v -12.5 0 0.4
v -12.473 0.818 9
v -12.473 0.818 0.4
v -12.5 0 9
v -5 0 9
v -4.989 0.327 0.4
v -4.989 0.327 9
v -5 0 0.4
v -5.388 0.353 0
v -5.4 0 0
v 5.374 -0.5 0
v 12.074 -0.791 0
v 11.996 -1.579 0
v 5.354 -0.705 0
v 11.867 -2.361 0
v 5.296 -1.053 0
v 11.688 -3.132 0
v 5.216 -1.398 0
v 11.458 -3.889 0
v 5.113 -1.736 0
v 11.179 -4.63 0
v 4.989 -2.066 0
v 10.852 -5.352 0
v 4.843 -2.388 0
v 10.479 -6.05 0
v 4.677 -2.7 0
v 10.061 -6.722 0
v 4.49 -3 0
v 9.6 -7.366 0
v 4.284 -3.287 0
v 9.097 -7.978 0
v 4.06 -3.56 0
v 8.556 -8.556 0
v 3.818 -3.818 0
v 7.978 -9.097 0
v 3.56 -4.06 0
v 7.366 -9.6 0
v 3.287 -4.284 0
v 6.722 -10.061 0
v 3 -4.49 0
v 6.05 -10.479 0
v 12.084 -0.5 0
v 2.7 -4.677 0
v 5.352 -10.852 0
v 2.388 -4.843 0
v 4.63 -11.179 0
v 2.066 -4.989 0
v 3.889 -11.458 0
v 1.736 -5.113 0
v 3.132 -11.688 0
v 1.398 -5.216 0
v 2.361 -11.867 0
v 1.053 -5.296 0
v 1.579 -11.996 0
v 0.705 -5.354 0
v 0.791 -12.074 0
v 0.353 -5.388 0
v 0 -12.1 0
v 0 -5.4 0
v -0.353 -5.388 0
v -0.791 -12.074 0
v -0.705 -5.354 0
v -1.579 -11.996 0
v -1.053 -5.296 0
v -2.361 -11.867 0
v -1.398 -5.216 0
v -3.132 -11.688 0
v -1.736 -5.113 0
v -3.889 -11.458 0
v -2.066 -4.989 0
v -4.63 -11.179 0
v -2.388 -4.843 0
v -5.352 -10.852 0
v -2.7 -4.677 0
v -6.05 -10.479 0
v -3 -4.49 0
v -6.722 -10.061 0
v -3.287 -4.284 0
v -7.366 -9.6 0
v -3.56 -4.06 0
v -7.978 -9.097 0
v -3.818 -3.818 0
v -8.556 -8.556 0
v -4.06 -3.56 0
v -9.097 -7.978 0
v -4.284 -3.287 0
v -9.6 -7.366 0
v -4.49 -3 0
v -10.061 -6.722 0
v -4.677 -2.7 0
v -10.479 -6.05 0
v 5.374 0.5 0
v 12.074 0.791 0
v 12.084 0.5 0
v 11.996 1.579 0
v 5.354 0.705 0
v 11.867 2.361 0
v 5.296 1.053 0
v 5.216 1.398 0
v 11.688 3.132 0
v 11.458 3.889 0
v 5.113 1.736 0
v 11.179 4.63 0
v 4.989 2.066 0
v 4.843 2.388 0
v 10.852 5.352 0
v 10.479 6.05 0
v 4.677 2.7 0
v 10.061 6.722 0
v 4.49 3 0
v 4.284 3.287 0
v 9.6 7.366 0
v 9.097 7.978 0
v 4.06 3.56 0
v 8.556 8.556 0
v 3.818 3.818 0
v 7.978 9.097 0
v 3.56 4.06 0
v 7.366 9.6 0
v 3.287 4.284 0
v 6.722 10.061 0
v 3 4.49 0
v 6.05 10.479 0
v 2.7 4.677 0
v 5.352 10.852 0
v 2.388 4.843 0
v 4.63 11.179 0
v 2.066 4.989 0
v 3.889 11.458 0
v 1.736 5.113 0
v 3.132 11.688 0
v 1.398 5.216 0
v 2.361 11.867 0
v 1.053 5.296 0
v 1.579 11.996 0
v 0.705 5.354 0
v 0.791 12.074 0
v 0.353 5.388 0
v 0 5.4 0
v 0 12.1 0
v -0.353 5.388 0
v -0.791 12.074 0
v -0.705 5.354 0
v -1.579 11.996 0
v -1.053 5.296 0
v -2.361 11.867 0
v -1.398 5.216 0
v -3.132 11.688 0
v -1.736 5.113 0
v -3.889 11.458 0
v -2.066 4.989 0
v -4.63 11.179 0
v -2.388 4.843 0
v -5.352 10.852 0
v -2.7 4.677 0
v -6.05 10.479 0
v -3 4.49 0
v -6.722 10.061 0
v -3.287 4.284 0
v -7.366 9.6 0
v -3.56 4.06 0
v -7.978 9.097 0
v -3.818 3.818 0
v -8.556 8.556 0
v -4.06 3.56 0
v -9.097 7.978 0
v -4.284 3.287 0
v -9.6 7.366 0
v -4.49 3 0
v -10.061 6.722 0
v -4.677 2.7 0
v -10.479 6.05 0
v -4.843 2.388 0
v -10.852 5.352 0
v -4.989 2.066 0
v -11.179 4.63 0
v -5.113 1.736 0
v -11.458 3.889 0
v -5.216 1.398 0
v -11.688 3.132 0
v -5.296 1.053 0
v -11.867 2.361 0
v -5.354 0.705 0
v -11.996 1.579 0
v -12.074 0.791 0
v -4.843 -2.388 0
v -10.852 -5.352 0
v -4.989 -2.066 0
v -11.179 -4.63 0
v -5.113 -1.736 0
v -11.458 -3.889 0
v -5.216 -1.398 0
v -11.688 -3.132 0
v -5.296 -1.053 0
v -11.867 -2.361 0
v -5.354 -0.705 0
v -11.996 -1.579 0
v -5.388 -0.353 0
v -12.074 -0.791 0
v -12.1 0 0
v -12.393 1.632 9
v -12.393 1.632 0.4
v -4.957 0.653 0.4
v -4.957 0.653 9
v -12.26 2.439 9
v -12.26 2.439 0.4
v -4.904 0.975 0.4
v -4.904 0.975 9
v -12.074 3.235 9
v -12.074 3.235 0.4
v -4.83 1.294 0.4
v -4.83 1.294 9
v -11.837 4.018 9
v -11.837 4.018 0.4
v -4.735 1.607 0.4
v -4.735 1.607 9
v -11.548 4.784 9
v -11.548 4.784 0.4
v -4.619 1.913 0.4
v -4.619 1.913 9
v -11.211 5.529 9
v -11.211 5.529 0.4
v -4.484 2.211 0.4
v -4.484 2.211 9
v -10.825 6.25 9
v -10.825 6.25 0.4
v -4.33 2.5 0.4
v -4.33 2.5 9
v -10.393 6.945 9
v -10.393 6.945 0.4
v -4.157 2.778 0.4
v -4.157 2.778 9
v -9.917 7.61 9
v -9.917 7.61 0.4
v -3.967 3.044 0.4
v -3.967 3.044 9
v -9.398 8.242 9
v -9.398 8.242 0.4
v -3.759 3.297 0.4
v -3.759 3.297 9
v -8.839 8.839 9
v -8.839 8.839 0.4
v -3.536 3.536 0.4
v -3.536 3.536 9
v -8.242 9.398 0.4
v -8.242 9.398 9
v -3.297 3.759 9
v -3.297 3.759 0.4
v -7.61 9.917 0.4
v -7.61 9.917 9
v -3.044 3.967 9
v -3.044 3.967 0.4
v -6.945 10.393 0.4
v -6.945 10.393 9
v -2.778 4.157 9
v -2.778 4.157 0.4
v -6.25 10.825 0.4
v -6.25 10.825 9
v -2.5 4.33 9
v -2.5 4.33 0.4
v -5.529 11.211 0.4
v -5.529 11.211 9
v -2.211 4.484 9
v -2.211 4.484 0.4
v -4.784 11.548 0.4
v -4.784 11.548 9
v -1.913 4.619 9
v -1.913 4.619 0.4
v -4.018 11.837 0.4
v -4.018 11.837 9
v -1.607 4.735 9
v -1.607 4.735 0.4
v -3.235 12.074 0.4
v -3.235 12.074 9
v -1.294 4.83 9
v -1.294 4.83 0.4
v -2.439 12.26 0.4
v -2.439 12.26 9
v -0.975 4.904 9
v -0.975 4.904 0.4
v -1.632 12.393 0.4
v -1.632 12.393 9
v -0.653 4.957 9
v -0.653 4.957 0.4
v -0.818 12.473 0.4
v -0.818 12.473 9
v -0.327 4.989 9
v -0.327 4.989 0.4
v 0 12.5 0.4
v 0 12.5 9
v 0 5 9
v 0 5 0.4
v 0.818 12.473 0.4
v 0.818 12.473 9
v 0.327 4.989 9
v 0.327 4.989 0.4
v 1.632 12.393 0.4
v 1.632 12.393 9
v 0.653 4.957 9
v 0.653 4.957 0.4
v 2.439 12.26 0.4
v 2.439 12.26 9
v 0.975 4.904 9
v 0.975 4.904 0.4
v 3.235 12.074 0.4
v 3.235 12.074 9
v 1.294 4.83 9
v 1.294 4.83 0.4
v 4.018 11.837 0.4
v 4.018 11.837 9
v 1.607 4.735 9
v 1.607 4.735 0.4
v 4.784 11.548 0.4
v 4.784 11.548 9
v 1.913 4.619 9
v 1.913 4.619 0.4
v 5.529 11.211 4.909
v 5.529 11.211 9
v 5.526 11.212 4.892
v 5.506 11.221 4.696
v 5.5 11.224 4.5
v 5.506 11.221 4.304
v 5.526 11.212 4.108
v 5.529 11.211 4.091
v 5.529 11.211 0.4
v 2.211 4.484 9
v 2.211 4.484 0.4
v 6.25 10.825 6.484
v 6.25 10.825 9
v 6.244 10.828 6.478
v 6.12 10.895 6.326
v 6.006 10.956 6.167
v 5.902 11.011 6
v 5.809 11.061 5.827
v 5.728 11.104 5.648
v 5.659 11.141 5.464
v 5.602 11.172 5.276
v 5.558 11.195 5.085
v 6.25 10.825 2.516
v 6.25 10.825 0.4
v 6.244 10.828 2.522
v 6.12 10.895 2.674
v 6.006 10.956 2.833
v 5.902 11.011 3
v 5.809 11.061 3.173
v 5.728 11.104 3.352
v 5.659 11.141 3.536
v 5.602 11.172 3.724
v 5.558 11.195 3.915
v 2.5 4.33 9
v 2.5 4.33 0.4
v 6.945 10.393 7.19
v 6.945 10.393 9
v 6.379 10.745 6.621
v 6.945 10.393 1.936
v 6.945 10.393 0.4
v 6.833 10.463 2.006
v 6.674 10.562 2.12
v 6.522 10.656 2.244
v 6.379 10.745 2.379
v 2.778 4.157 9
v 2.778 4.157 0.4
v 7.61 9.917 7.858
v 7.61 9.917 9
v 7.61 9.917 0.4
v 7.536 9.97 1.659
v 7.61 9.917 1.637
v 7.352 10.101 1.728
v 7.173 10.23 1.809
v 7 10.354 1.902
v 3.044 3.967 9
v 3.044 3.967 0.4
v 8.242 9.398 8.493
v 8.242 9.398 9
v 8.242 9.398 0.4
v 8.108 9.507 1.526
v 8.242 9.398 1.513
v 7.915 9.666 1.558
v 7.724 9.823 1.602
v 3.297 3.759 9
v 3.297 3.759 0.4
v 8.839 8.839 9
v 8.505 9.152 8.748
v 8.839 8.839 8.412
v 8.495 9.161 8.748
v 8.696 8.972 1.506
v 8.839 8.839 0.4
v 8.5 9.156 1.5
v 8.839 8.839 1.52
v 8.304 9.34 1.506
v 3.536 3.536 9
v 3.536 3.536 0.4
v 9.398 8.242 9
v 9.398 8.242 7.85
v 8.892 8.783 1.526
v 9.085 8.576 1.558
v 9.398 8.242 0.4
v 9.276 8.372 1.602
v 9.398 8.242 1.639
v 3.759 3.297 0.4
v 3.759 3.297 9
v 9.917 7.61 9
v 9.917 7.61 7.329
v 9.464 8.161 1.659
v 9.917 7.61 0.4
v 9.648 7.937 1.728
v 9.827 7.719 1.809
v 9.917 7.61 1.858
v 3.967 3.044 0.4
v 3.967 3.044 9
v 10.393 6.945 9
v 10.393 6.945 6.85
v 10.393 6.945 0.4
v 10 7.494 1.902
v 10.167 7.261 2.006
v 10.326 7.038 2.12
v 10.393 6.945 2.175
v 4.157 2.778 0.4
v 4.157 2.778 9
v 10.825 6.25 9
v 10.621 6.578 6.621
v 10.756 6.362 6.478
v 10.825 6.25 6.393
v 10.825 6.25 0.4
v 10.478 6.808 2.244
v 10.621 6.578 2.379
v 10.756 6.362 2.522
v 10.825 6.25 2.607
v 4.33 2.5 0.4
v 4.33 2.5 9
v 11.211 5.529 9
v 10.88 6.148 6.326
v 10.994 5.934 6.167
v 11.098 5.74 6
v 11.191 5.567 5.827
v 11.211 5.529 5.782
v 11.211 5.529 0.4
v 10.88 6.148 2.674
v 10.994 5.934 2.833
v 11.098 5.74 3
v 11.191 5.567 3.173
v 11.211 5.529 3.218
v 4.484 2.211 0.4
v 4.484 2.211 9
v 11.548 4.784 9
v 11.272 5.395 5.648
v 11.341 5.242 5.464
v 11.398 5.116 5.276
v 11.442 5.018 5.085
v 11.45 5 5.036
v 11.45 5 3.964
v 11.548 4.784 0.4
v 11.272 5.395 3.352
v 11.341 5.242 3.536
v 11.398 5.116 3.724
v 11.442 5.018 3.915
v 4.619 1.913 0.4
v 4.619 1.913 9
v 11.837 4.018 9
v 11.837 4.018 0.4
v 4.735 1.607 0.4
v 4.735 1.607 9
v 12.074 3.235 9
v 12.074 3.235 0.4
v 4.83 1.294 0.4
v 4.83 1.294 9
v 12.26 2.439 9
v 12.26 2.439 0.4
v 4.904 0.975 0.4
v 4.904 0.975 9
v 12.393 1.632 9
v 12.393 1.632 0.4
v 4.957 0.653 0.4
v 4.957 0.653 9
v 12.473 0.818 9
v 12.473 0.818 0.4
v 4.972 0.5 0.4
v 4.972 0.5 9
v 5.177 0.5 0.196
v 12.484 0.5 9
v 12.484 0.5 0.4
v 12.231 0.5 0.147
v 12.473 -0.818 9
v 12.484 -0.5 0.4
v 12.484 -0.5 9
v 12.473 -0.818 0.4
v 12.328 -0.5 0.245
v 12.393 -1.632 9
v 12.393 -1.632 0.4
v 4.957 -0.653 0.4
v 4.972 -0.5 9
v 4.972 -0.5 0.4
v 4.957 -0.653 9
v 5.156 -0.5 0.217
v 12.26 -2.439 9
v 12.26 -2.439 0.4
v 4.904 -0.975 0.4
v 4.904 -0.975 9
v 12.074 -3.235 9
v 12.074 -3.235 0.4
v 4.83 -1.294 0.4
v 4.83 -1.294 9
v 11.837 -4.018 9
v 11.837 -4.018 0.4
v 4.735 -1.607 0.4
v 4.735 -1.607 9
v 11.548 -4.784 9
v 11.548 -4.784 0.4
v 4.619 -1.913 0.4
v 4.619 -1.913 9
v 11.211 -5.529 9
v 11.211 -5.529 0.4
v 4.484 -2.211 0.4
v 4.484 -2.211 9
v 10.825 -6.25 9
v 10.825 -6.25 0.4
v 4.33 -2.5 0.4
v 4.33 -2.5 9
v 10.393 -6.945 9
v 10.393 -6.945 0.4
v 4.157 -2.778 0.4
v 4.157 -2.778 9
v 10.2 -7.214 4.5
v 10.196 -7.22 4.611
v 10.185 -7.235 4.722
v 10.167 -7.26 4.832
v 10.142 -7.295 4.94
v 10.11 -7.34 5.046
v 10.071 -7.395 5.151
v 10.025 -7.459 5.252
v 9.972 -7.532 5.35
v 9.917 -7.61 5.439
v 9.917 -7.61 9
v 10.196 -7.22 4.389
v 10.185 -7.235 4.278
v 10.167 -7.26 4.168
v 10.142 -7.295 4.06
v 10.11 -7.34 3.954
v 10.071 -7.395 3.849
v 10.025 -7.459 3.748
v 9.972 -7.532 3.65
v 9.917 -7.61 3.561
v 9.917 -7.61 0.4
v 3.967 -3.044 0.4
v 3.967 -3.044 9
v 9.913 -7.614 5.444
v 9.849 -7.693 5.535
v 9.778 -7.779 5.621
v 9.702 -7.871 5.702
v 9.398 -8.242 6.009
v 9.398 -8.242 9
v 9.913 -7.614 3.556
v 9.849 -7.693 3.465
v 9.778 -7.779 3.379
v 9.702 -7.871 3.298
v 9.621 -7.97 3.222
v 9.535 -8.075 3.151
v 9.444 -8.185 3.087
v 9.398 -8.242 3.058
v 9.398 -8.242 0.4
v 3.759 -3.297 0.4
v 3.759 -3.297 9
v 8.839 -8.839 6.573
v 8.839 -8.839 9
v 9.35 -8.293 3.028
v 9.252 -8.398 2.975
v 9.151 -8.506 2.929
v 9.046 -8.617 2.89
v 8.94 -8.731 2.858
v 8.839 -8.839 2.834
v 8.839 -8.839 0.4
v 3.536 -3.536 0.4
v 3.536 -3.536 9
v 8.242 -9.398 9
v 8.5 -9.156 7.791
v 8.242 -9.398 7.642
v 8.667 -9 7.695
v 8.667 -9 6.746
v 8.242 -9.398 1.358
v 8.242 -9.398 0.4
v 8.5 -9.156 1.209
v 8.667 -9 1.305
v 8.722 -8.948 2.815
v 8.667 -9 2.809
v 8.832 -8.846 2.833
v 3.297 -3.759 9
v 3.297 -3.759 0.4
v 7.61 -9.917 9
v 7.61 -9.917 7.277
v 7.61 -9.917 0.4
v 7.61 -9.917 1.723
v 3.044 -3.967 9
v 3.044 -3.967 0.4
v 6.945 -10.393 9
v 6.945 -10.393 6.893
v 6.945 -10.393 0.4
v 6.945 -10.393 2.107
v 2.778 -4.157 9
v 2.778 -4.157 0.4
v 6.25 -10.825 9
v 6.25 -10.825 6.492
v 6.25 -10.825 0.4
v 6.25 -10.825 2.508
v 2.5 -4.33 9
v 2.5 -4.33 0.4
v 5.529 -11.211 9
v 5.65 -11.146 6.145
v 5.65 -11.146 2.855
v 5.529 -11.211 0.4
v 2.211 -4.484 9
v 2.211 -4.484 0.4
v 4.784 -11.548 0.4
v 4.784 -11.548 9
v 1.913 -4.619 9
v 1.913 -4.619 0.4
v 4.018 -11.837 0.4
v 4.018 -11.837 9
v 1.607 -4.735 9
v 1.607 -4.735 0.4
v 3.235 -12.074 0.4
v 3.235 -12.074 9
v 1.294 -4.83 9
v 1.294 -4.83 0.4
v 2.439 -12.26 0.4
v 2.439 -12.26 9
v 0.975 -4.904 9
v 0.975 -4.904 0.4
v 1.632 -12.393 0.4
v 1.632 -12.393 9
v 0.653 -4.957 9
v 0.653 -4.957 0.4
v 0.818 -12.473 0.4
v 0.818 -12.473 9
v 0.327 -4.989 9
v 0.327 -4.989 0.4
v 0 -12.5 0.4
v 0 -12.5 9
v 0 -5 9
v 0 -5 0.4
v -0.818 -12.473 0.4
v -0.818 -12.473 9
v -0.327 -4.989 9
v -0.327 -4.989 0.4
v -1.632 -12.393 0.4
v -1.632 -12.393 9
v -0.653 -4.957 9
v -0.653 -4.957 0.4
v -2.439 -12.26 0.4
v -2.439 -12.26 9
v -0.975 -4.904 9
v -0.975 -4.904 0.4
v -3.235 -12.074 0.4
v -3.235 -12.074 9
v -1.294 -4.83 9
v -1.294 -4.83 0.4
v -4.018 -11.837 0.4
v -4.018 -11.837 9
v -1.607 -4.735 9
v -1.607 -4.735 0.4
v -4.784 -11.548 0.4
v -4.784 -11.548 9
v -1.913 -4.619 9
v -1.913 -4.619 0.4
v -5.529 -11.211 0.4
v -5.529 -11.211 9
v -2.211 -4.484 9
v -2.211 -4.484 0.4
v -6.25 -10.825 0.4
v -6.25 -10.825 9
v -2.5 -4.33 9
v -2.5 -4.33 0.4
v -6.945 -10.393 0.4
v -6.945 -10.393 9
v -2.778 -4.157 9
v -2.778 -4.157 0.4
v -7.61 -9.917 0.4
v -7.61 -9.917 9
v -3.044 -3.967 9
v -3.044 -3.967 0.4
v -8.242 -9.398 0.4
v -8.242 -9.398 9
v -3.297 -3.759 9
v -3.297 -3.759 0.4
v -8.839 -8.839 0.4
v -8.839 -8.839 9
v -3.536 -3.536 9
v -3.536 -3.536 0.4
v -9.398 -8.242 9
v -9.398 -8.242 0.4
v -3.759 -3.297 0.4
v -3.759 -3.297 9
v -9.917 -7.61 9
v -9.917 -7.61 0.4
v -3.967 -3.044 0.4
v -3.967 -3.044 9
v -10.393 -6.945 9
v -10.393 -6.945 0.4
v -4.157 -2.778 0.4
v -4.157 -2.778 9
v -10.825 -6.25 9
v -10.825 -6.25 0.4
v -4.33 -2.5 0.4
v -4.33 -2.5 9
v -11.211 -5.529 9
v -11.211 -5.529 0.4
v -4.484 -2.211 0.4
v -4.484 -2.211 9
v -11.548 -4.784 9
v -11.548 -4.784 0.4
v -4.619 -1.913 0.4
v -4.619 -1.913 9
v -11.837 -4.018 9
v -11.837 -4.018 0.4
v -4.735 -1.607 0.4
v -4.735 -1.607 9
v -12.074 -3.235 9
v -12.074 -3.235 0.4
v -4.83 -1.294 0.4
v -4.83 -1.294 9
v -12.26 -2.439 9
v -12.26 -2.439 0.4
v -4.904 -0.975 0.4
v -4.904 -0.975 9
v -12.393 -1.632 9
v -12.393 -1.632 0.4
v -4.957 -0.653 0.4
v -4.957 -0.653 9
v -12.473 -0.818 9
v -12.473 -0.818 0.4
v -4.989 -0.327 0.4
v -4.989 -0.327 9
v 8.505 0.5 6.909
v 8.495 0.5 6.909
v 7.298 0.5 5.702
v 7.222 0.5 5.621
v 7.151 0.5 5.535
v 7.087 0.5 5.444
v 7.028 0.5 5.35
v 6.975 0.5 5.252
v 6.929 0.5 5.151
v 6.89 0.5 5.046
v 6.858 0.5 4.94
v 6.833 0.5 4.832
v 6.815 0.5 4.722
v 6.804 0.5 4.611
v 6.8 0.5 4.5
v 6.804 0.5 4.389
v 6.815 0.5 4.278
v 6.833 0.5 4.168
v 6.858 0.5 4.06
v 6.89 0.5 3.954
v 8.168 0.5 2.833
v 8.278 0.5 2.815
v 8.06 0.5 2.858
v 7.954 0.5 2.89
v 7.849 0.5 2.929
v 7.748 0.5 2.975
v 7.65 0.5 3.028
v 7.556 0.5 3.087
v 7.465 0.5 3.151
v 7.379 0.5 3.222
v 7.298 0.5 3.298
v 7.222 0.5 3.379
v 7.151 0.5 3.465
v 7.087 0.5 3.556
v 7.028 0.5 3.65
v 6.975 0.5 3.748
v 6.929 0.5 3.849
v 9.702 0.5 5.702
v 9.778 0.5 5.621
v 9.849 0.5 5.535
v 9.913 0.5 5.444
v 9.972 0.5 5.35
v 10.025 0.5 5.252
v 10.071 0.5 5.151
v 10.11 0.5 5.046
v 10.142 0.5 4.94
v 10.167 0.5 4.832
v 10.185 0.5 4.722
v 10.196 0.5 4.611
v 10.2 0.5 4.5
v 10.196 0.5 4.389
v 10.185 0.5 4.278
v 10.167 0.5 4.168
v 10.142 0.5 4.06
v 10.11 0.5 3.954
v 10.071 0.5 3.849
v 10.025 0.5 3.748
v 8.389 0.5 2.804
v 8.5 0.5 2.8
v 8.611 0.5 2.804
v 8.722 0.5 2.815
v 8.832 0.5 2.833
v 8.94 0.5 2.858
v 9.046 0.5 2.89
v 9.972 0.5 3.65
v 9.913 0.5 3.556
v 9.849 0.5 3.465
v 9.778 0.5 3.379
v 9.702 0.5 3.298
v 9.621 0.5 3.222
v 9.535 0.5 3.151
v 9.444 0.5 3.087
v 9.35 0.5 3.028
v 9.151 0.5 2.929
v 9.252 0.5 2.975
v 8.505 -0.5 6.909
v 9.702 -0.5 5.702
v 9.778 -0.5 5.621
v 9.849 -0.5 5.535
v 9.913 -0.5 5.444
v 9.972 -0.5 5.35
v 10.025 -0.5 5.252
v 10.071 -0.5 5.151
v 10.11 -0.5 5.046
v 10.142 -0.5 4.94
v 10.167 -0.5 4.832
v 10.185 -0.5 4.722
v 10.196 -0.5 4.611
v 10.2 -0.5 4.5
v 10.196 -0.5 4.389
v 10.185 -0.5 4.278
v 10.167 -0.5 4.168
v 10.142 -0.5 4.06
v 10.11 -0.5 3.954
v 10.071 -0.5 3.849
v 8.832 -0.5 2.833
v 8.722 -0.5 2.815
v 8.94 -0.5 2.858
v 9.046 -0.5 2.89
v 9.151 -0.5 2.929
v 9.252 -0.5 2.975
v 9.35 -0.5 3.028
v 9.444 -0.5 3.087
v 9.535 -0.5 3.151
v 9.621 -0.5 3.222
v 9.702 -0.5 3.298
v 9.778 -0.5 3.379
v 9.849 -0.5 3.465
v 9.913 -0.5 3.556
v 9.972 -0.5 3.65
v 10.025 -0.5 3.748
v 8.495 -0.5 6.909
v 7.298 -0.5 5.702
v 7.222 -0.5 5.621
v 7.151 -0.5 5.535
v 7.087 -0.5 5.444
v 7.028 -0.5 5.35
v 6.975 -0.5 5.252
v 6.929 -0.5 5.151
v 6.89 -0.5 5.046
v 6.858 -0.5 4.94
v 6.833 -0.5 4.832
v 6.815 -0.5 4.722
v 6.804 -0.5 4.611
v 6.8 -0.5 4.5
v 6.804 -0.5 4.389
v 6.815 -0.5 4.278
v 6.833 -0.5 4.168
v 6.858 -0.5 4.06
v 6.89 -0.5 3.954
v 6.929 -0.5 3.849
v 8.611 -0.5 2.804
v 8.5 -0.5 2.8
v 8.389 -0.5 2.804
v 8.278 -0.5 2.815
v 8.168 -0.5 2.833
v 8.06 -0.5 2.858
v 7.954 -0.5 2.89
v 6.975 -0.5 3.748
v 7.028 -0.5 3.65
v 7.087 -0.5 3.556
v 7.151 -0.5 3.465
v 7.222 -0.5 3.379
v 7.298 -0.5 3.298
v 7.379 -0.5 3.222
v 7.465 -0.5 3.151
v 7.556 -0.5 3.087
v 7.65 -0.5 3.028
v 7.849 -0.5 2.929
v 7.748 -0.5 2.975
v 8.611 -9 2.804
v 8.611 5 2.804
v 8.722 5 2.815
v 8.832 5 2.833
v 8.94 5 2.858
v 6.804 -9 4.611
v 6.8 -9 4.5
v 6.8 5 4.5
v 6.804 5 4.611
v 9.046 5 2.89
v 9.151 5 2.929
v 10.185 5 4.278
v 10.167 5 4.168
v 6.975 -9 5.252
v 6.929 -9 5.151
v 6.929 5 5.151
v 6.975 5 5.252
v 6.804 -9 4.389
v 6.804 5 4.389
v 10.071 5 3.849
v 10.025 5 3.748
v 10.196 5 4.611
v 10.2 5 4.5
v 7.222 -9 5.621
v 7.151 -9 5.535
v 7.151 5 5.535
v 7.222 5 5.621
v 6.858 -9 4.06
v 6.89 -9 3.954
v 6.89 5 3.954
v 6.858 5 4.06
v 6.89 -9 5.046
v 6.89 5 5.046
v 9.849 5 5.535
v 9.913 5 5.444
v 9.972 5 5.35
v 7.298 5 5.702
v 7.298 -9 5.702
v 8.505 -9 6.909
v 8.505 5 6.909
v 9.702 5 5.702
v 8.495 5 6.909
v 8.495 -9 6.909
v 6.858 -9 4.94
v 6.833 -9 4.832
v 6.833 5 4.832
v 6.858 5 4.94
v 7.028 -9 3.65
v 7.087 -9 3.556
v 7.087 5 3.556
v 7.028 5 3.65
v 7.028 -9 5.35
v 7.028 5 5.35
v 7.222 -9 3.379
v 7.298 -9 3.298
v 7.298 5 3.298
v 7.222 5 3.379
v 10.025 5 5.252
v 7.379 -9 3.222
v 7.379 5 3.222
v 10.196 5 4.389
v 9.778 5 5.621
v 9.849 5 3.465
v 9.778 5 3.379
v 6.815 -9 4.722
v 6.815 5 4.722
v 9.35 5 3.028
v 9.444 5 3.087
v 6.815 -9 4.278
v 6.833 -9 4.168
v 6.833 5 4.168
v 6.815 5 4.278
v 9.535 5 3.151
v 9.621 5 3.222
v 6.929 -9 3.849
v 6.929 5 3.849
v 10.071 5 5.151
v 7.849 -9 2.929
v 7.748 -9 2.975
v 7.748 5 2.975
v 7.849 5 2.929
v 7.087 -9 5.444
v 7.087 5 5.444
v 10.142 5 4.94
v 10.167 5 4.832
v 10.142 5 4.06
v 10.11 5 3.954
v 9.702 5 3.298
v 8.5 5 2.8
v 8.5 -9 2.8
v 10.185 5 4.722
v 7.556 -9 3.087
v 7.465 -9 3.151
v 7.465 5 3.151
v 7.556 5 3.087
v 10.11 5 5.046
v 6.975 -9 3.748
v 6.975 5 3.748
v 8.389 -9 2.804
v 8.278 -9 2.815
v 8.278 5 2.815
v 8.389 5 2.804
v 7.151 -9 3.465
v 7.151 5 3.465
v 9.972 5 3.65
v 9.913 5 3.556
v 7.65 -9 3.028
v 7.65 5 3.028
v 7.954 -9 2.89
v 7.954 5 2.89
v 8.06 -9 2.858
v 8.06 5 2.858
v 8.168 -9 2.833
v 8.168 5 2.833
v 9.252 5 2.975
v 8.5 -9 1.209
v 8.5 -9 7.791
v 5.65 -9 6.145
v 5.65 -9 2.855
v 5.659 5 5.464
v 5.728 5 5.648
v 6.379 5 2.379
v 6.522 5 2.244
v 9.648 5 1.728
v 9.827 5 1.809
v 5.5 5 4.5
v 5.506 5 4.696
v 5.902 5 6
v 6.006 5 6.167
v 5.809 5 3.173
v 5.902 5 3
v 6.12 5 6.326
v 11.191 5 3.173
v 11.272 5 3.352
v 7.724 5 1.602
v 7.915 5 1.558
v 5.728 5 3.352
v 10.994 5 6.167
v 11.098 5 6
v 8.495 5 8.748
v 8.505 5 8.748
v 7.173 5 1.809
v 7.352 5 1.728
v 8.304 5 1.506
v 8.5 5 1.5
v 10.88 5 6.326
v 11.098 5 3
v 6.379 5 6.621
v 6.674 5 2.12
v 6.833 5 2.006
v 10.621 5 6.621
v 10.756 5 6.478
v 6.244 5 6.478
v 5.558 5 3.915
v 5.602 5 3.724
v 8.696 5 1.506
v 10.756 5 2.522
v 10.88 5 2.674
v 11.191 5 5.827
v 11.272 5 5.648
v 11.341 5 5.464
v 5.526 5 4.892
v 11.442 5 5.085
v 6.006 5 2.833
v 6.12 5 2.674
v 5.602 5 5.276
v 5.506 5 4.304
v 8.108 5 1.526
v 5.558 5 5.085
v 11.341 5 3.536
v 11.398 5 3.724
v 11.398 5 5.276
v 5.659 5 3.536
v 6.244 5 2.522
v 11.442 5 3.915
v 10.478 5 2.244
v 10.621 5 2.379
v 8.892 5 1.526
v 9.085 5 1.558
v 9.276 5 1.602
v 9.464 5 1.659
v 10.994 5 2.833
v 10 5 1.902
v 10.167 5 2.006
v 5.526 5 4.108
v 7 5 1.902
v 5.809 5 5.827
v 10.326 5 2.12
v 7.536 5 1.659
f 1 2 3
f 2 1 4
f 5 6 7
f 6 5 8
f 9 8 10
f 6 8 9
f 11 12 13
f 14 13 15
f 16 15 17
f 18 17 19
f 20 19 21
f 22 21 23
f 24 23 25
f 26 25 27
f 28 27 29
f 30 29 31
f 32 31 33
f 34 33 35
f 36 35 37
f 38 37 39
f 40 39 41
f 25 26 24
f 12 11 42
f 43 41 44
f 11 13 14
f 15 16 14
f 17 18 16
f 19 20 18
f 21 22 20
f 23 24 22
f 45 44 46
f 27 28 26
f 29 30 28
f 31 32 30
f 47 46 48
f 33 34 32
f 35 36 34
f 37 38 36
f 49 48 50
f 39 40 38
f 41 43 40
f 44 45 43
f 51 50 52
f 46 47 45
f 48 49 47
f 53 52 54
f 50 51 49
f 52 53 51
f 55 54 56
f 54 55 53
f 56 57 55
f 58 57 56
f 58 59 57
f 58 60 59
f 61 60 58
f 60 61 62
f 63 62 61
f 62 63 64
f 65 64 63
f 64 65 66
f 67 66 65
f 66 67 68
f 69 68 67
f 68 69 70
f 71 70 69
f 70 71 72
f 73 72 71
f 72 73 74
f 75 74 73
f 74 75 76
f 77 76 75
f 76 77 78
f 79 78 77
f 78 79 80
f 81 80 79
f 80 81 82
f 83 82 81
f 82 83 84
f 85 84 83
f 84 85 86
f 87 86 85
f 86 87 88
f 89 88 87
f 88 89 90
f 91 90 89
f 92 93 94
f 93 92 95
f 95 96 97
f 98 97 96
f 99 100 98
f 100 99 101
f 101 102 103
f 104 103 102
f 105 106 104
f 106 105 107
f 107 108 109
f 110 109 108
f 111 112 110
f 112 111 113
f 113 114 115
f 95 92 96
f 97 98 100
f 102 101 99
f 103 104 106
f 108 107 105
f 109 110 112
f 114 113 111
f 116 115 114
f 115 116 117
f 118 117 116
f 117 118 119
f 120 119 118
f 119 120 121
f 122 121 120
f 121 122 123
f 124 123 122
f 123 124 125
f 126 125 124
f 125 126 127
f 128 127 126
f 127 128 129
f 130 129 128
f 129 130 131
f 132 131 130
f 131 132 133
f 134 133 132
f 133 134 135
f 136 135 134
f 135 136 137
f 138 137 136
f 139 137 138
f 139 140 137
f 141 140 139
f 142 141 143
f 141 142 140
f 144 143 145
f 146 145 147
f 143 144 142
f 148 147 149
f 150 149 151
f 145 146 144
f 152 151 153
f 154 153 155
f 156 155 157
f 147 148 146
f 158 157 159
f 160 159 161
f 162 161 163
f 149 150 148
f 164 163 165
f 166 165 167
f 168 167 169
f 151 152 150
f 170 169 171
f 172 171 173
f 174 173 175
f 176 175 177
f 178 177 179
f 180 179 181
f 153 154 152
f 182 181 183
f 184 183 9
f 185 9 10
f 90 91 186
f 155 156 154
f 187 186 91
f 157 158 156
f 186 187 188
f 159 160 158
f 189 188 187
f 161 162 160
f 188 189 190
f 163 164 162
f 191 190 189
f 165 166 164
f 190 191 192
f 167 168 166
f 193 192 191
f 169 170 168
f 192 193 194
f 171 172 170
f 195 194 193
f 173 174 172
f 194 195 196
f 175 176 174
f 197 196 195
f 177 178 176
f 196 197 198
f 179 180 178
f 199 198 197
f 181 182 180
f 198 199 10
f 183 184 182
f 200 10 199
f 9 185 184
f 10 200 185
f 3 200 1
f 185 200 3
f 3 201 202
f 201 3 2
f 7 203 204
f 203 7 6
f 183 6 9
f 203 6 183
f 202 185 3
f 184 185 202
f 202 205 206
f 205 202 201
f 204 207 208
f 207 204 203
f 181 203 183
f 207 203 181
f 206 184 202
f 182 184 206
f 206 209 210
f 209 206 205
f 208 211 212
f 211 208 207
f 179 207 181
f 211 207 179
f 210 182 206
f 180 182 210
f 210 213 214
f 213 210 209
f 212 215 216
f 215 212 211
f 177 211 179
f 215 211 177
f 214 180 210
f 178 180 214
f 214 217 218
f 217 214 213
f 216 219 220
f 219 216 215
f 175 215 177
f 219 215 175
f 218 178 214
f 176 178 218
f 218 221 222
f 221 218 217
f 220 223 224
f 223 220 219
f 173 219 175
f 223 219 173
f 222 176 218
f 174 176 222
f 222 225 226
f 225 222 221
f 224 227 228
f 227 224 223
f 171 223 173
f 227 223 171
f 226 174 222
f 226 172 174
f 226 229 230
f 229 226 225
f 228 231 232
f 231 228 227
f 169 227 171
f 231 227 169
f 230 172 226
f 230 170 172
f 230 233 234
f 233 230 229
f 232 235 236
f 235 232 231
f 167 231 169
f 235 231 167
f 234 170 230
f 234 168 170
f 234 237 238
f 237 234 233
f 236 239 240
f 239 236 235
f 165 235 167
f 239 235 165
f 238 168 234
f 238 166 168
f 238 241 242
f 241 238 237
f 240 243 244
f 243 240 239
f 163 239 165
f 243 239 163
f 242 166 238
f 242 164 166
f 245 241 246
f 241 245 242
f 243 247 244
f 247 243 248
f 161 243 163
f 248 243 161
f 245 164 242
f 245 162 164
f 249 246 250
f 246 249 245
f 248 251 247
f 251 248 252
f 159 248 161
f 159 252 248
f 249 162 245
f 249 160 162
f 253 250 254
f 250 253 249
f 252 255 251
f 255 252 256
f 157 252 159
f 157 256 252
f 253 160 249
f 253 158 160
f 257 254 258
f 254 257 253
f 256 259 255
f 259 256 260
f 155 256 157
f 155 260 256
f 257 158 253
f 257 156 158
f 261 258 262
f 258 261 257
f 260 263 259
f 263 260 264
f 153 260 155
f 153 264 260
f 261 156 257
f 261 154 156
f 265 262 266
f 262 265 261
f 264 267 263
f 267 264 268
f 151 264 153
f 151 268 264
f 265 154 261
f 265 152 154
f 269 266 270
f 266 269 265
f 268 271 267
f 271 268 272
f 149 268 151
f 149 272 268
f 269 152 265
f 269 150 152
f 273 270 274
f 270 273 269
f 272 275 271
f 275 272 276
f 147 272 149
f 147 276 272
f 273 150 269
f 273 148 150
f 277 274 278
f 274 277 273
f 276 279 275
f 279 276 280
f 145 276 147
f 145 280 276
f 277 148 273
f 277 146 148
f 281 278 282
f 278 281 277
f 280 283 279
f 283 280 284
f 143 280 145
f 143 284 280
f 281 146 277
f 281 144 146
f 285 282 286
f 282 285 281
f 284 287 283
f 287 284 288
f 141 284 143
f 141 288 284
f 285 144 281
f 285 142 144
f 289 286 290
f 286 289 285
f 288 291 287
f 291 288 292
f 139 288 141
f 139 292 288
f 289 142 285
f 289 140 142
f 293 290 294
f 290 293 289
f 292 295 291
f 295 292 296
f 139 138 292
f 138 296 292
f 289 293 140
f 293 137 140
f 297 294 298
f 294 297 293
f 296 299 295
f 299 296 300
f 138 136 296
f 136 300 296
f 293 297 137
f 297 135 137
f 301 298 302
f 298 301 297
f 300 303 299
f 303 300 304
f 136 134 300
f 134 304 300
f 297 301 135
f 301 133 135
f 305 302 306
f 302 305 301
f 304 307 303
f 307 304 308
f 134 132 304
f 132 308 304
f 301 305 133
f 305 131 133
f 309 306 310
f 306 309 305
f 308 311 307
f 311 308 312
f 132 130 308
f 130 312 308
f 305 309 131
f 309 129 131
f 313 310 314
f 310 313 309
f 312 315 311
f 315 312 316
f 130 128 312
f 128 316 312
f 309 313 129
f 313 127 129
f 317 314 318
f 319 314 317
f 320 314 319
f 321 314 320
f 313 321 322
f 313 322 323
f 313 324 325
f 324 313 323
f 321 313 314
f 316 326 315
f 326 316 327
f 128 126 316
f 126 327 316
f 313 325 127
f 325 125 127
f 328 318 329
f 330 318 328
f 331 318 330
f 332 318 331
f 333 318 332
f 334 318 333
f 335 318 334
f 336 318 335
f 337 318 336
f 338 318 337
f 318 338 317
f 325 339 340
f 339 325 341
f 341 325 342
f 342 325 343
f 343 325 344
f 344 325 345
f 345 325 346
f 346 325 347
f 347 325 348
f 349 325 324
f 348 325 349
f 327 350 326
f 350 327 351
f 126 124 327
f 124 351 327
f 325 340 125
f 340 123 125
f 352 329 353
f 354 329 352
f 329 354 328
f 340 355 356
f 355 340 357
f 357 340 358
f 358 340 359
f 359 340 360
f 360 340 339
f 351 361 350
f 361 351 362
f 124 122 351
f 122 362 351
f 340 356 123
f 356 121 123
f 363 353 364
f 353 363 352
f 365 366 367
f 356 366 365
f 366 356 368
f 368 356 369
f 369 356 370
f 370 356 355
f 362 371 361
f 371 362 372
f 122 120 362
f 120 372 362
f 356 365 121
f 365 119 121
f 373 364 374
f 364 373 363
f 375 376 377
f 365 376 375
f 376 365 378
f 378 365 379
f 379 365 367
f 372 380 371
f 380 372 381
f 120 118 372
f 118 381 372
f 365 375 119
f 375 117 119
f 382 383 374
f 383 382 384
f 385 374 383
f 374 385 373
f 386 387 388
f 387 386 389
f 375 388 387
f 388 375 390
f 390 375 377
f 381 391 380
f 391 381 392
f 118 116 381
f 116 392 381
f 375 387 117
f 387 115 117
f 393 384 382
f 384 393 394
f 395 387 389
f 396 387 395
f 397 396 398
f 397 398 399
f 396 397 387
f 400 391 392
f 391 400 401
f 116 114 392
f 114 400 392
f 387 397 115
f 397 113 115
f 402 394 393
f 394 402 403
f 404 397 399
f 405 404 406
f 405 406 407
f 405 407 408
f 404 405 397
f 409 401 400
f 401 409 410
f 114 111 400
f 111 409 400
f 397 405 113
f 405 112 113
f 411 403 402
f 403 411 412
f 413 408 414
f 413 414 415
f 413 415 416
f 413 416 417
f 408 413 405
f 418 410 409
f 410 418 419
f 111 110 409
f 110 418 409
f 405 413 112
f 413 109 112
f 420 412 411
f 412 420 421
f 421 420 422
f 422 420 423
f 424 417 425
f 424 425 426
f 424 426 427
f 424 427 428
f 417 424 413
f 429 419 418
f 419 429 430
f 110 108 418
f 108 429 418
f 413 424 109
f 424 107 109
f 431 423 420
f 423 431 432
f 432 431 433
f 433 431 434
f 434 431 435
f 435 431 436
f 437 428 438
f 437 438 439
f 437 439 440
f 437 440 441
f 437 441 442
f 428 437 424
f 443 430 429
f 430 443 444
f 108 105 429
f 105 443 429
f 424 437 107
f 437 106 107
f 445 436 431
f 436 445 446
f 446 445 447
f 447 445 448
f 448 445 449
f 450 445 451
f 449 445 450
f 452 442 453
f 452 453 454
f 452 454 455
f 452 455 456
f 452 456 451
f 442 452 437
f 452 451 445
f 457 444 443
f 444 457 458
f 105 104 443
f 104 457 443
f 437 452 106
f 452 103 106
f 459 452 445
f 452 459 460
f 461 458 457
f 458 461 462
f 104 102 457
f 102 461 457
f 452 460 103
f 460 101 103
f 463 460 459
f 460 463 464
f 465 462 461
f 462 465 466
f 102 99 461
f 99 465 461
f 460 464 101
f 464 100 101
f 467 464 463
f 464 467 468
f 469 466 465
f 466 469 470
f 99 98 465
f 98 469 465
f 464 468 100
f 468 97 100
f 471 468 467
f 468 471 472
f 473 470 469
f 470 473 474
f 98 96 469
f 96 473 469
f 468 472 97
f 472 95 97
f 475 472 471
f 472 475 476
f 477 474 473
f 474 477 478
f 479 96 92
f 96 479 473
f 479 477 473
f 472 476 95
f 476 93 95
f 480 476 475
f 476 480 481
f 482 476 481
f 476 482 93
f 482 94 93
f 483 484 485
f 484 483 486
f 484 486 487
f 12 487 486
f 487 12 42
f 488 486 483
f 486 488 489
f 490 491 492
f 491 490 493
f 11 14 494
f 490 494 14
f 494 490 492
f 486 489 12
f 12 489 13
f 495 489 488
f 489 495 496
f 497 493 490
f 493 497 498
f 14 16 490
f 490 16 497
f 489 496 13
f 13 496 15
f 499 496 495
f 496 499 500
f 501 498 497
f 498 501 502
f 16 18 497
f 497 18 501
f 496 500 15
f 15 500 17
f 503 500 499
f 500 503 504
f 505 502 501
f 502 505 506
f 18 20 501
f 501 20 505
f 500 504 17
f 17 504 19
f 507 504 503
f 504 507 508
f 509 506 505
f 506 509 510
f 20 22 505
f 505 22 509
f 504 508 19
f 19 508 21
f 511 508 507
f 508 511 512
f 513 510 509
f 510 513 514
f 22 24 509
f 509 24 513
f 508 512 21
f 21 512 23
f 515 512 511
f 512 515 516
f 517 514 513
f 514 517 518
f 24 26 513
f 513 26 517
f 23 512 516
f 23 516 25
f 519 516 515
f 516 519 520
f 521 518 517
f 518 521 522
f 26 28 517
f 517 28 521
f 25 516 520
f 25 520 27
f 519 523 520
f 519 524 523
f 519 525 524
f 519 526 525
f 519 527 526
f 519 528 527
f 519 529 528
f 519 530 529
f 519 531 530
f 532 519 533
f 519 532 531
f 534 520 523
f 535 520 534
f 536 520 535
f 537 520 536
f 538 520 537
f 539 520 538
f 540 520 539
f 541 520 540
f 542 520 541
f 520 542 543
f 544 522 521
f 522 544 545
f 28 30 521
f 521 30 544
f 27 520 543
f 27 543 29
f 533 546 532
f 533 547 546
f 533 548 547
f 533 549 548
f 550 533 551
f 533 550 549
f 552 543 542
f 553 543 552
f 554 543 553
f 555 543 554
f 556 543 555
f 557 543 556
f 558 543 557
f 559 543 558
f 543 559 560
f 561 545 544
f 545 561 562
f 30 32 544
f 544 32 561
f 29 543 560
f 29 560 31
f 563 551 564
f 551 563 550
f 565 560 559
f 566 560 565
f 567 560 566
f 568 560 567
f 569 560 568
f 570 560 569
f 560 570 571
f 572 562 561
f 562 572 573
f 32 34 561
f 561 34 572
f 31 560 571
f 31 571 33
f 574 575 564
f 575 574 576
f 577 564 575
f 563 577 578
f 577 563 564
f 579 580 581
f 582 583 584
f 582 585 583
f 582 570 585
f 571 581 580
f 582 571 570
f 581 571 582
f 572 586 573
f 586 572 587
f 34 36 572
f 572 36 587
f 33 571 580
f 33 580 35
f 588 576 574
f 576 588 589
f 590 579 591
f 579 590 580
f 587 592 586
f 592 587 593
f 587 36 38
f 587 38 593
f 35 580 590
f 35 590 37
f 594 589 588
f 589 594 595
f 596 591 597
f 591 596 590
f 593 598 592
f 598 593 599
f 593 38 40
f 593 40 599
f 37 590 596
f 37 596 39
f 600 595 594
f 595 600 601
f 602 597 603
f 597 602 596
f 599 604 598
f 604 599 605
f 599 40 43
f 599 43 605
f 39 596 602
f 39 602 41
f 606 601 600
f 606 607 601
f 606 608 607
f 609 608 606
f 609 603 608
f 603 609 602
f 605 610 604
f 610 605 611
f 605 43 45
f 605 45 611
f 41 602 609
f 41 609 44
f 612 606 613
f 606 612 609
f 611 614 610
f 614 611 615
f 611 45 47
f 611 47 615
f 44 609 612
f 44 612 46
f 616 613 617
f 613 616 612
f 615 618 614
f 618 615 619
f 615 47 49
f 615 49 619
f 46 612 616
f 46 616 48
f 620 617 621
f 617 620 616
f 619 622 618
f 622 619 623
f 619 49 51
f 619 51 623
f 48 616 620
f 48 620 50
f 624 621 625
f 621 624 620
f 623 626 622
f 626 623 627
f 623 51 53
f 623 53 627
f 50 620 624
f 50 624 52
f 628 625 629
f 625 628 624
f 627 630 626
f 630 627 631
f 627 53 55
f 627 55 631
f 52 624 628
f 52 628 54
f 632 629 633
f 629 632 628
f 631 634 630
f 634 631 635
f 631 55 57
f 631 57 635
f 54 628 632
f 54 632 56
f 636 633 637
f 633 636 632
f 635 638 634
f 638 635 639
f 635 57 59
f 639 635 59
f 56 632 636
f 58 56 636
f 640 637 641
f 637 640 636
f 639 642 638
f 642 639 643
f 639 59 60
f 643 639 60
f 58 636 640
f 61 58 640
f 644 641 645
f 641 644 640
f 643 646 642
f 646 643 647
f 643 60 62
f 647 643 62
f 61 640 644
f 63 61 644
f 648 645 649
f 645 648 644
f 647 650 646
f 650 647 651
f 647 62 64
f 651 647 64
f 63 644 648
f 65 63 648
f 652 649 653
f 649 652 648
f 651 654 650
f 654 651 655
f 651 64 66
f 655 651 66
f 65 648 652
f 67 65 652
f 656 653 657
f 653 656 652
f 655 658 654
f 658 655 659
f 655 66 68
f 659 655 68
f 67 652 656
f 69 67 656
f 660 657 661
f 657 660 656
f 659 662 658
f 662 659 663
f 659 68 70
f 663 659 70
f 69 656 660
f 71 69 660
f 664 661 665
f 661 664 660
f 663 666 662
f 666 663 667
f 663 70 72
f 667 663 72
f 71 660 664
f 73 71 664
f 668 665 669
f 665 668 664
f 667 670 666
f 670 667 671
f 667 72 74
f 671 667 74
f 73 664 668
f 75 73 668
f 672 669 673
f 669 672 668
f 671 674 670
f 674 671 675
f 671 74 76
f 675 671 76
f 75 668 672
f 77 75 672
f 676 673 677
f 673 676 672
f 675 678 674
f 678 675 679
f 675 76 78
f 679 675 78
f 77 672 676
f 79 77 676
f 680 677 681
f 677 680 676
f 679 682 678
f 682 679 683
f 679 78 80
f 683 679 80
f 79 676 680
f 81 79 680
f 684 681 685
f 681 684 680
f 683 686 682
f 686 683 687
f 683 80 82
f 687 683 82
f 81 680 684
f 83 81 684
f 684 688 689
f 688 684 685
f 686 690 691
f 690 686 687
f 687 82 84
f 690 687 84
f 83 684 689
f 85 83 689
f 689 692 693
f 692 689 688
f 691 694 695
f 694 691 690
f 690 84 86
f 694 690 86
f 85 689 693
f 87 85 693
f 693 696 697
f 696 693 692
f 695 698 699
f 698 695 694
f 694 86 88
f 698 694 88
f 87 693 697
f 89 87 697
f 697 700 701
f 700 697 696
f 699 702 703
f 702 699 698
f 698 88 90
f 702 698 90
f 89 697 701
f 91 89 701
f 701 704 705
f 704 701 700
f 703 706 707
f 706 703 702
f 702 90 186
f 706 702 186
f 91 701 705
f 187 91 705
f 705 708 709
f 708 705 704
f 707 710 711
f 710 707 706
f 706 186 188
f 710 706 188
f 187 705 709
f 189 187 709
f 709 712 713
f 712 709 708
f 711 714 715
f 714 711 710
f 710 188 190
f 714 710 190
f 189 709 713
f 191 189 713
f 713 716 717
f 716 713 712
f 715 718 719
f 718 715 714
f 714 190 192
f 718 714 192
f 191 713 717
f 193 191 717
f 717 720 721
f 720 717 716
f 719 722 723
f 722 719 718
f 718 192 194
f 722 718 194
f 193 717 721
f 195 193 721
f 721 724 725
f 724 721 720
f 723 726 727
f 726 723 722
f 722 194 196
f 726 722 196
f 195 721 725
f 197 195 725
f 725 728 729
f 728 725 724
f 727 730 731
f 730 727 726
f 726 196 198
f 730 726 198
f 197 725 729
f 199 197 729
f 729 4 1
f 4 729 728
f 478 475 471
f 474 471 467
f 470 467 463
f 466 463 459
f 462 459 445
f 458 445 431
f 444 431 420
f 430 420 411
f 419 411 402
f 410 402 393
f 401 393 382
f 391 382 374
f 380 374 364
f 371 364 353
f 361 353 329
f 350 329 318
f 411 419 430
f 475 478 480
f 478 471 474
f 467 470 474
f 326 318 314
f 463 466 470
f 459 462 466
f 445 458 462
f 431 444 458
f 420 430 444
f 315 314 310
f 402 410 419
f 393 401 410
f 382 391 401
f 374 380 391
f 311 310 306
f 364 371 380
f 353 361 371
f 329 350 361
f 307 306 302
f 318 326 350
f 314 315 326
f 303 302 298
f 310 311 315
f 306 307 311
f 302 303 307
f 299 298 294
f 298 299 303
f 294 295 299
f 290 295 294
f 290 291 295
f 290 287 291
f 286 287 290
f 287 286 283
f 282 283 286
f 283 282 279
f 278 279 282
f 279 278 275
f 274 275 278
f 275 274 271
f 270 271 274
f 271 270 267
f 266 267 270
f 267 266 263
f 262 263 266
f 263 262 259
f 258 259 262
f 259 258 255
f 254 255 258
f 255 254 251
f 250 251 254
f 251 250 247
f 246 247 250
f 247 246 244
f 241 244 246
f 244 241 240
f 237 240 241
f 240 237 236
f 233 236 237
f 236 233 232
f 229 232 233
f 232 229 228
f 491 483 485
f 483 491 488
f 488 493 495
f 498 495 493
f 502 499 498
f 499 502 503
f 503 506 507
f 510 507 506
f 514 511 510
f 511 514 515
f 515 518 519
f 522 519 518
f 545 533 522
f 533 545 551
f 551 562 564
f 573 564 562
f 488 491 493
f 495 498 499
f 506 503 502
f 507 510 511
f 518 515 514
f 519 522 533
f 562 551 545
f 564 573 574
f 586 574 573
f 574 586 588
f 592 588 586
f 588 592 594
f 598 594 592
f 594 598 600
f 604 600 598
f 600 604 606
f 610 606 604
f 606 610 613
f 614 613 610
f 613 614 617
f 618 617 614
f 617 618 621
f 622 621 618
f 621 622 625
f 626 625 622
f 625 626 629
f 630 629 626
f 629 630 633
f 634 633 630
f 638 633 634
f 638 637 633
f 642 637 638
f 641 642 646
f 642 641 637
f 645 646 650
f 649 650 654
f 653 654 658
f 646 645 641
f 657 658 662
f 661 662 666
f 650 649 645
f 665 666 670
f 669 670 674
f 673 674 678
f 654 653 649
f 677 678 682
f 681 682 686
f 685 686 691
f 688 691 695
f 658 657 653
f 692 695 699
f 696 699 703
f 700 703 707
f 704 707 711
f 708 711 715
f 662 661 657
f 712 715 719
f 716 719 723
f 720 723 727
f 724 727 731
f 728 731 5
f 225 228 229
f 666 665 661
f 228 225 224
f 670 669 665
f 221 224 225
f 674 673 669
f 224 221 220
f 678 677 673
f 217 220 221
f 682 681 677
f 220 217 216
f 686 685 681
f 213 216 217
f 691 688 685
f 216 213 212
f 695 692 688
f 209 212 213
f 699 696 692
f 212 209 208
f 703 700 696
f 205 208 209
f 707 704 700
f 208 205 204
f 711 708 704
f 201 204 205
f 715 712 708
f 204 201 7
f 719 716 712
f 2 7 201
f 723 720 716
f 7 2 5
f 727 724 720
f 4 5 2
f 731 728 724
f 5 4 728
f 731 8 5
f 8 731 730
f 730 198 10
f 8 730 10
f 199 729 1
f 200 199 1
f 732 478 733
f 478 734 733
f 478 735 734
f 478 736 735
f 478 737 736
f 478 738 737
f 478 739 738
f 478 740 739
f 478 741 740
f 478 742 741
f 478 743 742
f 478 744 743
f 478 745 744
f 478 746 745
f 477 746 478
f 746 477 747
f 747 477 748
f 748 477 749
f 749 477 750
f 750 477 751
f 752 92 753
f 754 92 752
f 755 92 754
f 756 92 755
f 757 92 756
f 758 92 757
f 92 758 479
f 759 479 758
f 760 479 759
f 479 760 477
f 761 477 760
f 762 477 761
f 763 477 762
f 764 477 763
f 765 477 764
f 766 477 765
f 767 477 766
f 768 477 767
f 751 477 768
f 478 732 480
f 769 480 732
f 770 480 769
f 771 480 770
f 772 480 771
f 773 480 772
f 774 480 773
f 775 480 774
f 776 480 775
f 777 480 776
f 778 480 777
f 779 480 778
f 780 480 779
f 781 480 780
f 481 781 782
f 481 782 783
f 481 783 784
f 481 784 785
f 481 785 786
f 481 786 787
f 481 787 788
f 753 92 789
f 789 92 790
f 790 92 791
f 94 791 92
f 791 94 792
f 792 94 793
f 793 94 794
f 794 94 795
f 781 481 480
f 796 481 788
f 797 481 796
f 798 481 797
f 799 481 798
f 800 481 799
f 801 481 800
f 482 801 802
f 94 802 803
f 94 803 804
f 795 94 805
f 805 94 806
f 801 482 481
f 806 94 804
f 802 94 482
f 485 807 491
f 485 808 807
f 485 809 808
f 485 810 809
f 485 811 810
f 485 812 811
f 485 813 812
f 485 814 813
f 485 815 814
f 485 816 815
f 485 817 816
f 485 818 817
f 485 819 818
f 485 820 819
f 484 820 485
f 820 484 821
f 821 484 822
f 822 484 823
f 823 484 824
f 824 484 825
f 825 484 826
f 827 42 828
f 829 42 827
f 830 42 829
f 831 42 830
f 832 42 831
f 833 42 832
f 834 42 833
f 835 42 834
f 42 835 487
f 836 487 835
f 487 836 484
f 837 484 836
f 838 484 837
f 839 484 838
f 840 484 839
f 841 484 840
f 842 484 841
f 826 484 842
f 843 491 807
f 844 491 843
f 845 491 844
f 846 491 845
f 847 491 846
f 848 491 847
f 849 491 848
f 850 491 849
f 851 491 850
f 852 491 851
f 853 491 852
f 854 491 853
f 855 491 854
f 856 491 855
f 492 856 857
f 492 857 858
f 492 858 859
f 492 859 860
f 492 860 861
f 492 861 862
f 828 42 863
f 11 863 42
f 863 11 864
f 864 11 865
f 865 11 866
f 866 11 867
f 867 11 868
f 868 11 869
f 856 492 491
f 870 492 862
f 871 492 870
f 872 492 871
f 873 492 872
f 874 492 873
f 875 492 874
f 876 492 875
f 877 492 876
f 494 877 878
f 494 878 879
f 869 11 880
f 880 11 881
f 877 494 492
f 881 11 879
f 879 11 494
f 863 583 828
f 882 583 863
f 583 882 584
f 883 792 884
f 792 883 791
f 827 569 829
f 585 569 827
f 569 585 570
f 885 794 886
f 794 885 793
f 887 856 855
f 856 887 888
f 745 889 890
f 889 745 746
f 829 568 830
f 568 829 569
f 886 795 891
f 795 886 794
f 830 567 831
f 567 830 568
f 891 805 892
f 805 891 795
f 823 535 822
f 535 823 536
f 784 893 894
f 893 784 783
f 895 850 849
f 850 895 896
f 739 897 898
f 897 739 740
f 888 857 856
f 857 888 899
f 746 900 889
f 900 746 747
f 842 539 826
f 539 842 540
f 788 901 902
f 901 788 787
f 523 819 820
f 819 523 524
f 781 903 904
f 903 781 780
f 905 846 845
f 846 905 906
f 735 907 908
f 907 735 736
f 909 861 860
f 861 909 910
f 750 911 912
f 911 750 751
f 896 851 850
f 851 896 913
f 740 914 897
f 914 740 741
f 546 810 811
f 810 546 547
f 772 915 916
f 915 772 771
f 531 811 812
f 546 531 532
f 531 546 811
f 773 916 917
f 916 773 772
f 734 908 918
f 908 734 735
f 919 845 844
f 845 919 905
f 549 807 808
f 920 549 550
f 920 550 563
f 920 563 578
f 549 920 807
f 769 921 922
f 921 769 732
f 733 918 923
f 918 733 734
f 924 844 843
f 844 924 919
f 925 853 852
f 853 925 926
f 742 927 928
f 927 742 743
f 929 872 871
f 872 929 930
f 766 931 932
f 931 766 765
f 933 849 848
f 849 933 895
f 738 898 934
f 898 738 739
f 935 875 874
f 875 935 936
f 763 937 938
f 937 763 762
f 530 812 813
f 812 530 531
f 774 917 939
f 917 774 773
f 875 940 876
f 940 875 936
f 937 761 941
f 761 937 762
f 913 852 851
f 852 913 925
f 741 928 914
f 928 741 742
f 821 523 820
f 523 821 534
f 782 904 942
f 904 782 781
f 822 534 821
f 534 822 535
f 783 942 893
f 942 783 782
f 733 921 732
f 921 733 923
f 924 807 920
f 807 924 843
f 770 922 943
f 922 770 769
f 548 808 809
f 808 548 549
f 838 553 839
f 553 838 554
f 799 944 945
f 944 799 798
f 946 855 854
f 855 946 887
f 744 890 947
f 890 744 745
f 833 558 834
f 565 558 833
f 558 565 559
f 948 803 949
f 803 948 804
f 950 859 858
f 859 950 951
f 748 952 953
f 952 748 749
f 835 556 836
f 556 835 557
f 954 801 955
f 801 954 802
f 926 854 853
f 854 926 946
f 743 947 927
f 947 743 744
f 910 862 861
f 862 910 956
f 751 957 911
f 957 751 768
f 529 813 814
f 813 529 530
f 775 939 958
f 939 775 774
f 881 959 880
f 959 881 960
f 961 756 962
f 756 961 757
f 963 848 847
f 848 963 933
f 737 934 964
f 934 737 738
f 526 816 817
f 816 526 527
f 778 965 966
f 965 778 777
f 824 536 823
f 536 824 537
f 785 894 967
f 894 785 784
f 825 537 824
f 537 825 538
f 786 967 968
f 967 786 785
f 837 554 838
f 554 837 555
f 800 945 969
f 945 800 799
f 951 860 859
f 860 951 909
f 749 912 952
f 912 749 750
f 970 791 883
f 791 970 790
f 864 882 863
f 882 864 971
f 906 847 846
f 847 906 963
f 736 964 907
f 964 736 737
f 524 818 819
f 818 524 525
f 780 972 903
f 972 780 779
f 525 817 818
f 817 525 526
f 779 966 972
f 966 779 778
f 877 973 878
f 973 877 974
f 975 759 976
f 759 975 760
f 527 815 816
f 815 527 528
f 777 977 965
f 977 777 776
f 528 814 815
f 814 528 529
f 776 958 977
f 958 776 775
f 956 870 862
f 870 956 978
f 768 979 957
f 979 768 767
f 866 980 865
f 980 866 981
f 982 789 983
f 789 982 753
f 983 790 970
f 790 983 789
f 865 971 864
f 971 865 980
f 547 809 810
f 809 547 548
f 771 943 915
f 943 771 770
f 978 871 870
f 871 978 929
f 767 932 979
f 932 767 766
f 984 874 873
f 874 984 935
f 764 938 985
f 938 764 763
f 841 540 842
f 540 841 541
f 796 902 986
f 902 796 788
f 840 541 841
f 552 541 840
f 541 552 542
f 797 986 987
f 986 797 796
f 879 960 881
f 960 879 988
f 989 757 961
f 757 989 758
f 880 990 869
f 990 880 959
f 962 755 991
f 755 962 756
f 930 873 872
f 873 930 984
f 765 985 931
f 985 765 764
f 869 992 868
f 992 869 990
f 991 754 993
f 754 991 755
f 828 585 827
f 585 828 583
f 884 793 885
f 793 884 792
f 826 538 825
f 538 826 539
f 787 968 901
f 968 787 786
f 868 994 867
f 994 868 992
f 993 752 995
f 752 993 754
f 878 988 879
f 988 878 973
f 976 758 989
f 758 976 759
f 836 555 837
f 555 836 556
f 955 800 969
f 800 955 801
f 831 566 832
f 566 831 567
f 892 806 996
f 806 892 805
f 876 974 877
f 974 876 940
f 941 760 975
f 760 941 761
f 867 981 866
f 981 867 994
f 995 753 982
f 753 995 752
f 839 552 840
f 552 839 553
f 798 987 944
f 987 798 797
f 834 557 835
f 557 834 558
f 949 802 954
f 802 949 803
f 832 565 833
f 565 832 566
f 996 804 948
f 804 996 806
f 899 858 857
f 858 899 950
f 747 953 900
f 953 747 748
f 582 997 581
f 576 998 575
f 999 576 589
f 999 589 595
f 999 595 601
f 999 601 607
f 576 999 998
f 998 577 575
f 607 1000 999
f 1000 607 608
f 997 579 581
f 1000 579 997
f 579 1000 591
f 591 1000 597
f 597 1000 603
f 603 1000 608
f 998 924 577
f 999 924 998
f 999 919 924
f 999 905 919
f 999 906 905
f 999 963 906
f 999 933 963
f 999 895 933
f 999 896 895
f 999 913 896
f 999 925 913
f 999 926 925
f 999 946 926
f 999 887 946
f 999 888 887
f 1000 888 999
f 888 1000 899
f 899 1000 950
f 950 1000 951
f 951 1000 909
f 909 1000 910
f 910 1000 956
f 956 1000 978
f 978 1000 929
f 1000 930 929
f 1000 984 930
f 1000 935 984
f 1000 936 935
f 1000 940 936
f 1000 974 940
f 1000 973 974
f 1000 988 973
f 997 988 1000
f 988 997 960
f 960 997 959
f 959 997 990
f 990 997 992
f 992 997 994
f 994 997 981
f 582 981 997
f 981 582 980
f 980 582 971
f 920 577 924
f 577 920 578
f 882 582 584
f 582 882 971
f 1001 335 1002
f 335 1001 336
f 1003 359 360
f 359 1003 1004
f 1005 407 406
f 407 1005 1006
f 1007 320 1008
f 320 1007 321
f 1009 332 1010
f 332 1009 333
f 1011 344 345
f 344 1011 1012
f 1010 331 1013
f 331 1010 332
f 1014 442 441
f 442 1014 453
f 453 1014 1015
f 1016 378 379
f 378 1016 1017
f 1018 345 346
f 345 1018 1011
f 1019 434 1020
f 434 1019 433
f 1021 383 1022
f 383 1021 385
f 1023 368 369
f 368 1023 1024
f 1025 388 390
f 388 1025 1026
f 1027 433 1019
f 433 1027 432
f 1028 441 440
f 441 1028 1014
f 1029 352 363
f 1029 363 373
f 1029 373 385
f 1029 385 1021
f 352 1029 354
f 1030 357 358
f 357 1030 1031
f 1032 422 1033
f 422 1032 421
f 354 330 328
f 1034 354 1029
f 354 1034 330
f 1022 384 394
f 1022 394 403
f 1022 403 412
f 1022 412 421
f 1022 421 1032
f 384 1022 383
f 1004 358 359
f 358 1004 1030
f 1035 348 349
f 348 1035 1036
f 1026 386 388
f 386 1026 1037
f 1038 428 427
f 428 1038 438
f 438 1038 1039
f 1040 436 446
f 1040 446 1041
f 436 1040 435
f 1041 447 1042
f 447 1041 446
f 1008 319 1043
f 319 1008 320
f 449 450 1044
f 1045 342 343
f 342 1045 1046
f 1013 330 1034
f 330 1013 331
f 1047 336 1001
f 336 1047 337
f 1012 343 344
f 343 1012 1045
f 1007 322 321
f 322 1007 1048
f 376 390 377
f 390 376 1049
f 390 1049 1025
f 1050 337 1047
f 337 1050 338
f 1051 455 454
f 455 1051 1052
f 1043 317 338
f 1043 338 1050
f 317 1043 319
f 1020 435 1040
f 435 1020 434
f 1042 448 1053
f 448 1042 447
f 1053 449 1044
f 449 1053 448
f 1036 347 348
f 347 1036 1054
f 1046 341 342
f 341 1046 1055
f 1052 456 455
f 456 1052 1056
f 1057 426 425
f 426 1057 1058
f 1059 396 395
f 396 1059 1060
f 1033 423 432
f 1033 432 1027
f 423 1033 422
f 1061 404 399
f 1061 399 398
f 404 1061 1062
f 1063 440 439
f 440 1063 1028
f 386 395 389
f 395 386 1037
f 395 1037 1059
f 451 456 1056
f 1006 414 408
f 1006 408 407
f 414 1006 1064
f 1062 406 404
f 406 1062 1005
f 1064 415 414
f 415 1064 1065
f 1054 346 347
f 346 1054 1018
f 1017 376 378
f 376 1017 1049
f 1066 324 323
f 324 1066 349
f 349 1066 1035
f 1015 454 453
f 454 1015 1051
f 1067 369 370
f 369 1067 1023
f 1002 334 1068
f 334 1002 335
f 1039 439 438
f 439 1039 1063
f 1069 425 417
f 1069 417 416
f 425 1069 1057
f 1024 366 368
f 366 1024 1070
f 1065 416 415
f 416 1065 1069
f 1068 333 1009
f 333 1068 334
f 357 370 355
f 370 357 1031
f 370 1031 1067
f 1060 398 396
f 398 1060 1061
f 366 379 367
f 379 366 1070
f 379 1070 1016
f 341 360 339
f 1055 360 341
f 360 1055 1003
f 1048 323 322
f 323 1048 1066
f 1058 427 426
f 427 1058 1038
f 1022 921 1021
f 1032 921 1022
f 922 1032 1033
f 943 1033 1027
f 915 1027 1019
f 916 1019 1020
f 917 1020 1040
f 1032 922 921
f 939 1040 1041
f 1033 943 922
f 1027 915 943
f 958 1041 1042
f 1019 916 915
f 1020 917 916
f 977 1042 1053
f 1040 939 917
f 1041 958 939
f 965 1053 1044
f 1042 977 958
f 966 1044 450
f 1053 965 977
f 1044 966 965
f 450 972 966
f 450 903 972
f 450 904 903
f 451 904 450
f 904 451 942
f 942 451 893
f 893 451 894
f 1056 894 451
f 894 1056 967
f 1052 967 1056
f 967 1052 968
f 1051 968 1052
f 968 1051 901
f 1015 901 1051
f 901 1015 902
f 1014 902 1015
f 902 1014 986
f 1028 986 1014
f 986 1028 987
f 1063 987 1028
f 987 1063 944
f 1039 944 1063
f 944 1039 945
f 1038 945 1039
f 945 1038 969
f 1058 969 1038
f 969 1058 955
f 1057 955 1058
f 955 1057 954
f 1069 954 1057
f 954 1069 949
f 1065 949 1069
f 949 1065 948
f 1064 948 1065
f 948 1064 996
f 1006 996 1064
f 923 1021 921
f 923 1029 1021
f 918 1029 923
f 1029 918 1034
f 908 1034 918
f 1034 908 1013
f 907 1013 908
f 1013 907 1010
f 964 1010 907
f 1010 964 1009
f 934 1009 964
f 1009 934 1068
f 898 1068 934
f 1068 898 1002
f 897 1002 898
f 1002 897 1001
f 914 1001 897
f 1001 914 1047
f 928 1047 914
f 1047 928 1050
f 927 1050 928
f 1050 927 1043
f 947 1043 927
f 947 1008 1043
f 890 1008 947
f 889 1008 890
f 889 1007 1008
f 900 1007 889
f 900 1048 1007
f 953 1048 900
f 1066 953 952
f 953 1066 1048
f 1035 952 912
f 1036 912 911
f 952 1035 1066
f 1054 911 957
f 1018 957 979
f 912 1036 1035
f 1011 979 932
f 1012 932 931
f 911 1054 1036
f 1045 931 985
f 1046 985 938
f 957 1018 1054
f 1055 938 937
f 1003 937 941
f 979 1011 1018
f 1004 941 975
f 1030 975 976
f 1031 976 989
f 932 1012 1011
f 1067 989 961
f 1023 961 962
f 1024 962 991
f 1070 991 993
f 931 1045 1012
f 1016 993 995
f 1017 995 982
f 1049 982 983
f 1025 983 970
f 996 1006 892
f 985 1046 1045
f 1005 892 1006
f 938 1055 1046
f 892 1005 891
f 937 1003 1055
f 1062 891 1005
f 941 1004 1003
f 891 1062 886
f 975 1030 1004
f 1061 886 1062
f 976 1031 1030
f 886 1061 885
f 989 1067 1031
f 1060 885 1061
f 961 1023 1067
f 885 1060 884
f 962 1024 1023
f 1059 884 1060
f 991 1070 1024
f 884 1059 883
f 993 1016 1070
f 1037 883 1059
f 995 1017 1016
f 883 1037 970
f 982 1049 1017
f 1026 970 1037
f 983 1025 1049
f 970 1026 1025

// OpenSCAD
// One-piece clamping shaft collar with an M3 clamp screw across the slit.
// The screw hole is a teardrop (point up); the far side has a nut pocket.
bore_diameter = 10;
outer_diameter = 25;
collar_width = 9;
slit = 1.0;
screw_x = 8.5;
screw_z = 4.5;
screw_clear = 3.4;
nut_af = 5.7;   // M3 nut across flats plus clearance
chamfer = 0.4;
$fn = 96;

module teardrop_y(d, len) {
    // axis along Y, point towards +Z
    rotate([90, 0, 0]) linear_extrude(len, center = true)
        hull() {
            circle(d = d);
            translate([0, d/2*sqrt(2)]) square(0.01, center = true);
        }
}

difference() {
    rotate_extrude()
        polygon([
            [bore_diameter/2 + chamfer, 0], [outer_diameter/2 - chamfer, 0],
            [outer_diameter/2, chamfer], [outer_diameter/2, collar_width],
            [bore_diameter/2, collar_width], [bore_diameter/2, chamfer]
        ]);
    translate([bore_diameter/2 - 1, -slit/2, -1]) cube([outer_diameter, slit, collar_width + 2]);
    translate([screw_x, 0, screw_z]) teardrop_y(screw_clear, outer_diameter + 2);
    // nut pocket on -Y, open to the outside, head counterbore on +Y
    translate([screw_x, -9, screw_z]) rotate([90, 0, 0])
        rotate([0, 0, 30]) cylinder(d = nut_af / cos(30), h = 10, $fn = 6);
    translate([screw_x, 9, screw_z]) teardrop_y(6.0, 8);
}
